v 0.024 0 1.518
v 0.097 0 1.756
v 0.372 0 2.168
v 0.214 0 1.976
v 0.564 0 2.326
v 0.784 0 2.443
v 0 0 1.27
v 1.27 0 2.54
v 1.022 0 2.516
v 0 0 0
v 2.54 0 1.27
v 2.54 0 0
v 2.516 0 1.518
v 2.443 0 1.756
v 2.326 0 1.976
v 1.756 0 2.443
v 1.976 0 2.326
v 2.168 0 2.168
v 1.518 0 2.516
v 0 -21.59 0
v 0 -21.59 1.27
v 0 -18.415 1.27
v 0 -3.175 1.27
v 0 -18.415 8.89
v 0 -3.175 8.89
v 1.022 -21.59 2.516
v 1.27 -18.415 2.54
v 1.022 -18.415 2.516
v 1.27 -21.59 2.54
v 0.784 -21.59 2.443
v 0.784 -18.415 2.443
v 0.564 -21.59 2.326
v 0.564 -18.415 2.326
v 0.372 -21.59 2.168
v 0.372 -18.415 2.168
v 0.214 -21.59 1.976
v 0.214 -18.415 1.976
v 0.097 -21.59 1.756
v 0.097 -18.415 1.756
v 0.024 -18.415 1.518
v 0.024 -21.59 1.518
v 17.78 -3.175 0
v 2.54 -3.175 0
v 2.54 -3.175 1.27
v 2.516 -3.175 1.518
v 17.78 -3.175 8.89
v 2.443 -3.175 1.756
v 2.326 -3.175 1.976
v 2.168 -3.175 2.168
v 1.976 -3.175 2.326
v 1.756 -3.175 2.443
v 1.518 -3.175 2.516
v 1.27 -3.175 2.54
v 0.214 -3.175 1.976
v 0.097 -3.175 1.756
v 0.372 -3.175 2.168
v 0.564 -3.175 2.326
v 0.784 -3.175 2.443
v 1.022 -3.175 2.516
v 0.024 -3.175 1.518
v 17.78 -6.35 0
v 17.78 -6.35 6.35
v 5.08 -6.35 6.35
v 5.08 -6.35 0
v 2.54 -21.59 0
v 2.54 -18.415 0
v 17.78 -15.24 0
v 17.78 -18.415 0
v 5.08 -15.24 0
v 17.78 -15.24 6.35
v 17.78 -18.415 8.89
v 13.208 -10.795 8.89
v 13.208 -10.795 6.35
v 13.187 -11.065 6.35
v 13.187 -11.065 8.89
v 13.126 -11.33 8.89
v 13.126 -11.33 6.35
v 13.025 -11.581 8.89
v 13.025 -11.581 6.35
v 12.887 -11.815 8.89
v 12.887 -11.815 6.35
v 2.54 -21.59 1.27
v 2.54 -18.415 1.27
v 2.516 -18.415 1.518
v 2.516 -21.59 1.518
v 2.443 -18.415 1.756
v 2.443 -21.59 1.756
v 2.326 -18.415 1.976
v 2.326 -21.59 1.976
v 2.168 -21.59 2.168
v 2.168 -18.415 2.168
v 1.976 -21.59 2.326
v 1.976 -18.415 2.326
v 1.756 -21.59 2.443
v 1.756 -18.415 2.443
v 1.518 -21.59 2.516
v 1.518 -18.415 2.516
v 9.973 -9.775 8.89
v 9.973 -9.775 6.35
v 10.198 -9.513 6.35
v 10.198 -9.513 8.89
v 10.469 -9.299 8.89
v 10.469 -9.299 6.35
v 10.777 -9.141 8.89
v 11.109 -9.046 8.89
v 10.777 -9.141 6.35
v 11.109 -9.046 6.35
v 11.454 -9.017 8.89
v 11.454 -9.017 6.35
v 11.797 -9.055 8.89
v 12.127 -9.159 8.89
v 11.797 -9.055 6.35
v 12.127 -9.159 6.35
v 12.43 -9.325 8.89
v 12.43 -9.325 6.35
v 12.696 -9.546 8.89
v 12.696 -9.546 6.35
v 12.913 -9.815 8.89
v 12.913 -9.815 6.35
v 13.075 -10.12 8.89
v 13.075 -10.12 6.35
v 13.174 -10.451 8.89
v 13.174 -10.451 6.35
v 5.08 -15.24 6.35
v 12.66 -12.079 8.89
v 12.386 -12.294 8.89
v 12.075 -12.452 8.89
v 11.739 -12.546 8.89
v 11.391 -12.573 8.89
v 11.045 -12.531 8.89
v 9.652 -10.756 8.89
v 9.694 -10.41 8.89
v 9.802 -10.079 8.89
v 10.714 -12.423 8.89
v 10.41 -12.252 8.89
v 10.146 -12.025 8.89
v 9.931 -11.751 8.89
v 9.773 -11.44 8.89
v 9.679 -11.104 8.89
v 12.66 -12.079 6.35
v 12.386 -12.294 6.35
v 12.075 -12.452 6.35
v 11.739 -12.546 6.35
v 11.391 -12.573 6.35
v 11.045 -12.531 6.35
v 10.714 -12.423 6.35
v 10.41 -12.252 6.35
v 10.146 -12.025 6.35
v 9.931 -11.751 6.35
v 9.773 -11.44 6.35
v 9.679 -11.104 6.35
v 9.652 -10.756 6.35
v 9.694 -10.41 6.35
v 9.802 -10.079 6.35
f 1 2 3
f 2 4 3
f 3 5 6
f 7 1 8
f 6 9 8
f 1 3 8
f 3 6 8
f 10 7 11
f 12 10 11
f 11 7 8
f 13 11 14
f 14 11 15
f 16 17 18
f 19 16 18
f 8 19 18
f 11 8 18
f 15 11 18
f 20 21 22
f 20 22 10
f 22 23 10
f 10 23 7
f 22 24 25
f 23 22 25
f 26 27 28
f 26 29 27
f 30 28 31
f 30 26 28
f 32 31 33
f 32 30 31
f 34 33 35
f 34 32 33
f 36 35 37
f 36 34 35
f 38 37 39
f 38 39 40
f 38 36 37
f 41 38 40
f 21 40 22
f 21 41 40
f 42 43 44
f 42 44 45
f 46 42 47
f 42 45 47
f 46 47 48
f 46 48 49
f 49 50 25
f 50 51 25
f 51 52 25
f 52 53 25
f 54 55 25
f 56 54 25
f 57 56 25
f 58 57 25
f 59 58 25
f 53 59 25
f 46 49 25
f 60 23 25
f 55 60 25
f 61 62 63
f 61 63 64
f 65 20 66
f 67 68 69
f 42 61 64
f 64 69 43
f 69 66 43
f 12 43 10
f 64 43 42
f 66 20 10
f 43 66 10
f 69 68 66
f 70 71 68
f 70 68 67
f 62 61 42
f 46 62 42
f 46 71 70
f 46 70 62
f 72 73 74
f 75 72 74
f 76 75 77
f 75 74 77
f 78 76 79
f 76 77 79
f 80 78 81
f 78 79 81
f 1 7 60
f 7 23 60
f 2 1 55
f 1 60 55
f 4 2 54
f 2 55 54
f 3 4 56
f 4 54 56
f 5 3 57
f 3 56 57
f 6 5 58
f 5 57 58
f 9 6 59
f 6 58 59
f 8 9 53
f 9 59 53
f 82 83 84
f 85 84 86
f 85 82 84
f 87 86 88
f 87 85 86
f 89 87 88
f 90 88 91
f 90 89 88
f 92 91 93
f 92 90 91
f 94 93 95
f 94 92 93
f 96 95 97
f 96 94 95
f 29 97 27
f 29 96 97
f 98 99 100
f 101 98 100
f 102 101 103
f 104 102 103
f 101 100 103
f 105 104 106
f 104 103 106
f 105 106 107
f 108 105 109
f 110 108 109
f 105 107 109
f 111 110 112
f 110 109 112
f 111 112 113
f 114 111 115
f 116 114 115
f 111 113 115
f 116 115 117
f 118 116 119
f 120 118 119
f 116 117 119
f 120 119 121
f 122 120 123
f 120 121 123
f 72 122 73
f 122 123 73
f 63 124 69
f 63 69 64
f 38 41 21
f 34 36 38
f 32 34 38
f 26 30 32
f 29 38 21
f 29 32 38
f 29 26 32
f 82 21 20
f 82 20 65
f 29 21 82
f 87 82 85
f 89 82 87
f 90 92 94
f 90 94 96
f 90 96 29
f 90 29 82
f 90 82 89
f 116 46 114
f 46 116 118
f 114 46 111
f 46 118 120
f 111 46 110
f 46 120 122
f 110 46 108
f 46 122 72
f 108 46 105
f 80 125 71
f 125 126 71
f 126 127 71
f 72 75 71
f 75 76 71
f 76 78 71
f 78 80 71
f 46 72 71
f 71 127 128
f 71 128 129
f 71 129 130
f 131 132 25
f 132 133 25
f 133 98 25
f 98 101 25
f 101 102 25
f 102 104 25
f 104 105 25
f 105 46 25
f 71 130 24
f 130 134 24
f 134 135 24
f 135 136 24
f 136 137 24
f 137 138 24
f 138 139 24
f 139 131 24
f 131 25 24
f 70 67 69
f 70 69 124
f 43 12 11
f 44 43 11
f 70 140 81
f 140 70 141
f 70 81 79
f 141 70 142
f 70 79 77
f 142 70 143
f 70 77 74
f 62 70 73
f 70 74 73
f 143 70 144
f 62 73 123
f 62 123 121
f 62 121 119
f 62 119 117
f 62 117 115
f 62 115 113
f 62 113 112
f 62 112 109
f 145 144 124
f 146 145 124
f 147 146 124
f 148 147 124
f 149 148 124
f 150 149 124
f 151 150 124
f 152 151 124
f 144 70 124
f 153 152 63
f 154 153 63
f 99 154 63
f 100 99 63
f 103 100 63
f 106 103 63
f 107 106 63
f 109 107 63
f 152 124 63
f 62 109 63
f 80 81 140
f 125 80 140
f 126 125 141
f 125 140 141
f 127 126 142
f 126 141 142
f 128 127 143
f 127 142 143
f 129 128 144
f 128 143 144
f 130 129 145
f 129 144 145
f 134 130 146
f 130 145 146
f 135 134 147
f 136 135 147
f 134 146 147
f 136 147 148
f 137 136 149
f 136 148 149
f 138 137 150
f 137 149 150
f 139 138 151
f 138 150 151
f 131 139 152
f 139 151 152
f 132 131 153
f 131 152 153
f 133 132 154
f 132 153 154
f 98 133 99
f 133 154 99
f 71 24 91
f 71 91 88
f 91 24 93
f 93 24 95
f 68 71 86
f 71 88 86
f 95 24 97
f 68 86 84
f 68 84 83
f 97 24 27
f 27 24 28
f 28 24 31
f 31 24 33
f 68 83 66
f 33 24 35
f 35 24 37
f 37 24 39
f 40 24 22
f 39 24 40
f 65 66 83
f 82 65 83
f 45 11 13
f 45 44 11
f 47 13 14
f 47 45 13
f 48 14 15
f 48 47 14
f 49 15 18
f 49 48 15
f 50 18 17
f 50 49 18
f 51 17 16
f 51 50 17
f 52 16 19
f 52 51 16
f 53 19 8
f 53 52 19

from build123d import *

# Parameters (mm, degrees)
F0_W          = 2.54
F0_H          = 2.54
F1_DEPTH      = 21.59
F3_DEPTH      = 2.54
F3_DEPTH_BACK = 2.54
F5_DEPTH      = 12.7
F7_DEPTH      = 25.4
F8_R          = 1.26999


# Not quite as in the source:
# - a fillet or chamfer is up to 0.001 mm smaller than in the source, because OpenCascade refuses the exact size


with BuildPart() as f1:
    # F0 (on Front) → F1 (new body)
    with BuildSketch(Plane.XZ):
        with Locations((1.27, 1.27)):
            Rectangle(F0_W, F0_H)
    extrude(amount=F1_DEPTH)

    # F2 (on face) → F3 (join, two sides)
    with BuildSketch(Plane.YZ.offset(2.54)) as f3_sk:
        Polygon((-18.415, 8.89), (-18.415, 2.54), (-18.415, 0), (-3.175, 0), (-3.175, 2.54), (-3.175, 8.89), align=None)
    extrude(amount=F3_DEPTH)
    extrude(f3_sk.sketch, amount=-F3_DEPTH_BACK)

    # F4 (on face) → F5 (join)
    with BuildSketch(Plane.YZ.offset(5.08)):
        Polygon((-18.415, 8.89), (-18.415, 0), (-15.24, 0), (-15.24, 6.35), (-6.35, 6.35), (-6.35, 0), (-3.175, 0), (-3.175, 8.89), align=None)
    extrude(amount=F5_DEPTH)

    # F6 (on face) → F7 (cut)
    with BuildSketch(Plane(origin=(0, 0, 6.35), x_dir=(1, 0, 0), z_dir=(0, 0, -1))):
        with BuildLine():
            ThreePointArc((12.8865943547, 11.8146160483), (10.4103839517, 12.2515943547), (9.9734056453, 9.7753839517))
            Line((9.9734056453, 9.7753839517), (12.8865943547, 11.8146160483))
        make_face()
        with BuildLine():
            Line((12.8865943547, 11.8146160483), (9.9734056453, 9.7753839517))
            ThreePointArc((9.9734056453, 9.7753839517), (11.9645368263, 9.099254034), (13.208, 10.795))
            ThreePointArc((13.208, 10.795), (13.125745966, 11.3295368263), (12.8865943547, 11.8146160483))
        make_face()
    extrude(amount=-F7_DEPTH, mode=Mode.SUBTRACT)

    # F8 (radius 1.27 in the source; OpenCascade refuses exactly that, so slightly less here)
    f8_edges = [f1.edges().sort_by_distance(p)[0] for p in [
        (0, -1.5875, 2.54),
        (2.54, -1.5875, 2.54),
        (0, -20.0025, 2.54),
        (2.54, -20.0025, 2.54),
    ]]
    fillet(f8_edges, radius=F8_R)


solid = f1.part
